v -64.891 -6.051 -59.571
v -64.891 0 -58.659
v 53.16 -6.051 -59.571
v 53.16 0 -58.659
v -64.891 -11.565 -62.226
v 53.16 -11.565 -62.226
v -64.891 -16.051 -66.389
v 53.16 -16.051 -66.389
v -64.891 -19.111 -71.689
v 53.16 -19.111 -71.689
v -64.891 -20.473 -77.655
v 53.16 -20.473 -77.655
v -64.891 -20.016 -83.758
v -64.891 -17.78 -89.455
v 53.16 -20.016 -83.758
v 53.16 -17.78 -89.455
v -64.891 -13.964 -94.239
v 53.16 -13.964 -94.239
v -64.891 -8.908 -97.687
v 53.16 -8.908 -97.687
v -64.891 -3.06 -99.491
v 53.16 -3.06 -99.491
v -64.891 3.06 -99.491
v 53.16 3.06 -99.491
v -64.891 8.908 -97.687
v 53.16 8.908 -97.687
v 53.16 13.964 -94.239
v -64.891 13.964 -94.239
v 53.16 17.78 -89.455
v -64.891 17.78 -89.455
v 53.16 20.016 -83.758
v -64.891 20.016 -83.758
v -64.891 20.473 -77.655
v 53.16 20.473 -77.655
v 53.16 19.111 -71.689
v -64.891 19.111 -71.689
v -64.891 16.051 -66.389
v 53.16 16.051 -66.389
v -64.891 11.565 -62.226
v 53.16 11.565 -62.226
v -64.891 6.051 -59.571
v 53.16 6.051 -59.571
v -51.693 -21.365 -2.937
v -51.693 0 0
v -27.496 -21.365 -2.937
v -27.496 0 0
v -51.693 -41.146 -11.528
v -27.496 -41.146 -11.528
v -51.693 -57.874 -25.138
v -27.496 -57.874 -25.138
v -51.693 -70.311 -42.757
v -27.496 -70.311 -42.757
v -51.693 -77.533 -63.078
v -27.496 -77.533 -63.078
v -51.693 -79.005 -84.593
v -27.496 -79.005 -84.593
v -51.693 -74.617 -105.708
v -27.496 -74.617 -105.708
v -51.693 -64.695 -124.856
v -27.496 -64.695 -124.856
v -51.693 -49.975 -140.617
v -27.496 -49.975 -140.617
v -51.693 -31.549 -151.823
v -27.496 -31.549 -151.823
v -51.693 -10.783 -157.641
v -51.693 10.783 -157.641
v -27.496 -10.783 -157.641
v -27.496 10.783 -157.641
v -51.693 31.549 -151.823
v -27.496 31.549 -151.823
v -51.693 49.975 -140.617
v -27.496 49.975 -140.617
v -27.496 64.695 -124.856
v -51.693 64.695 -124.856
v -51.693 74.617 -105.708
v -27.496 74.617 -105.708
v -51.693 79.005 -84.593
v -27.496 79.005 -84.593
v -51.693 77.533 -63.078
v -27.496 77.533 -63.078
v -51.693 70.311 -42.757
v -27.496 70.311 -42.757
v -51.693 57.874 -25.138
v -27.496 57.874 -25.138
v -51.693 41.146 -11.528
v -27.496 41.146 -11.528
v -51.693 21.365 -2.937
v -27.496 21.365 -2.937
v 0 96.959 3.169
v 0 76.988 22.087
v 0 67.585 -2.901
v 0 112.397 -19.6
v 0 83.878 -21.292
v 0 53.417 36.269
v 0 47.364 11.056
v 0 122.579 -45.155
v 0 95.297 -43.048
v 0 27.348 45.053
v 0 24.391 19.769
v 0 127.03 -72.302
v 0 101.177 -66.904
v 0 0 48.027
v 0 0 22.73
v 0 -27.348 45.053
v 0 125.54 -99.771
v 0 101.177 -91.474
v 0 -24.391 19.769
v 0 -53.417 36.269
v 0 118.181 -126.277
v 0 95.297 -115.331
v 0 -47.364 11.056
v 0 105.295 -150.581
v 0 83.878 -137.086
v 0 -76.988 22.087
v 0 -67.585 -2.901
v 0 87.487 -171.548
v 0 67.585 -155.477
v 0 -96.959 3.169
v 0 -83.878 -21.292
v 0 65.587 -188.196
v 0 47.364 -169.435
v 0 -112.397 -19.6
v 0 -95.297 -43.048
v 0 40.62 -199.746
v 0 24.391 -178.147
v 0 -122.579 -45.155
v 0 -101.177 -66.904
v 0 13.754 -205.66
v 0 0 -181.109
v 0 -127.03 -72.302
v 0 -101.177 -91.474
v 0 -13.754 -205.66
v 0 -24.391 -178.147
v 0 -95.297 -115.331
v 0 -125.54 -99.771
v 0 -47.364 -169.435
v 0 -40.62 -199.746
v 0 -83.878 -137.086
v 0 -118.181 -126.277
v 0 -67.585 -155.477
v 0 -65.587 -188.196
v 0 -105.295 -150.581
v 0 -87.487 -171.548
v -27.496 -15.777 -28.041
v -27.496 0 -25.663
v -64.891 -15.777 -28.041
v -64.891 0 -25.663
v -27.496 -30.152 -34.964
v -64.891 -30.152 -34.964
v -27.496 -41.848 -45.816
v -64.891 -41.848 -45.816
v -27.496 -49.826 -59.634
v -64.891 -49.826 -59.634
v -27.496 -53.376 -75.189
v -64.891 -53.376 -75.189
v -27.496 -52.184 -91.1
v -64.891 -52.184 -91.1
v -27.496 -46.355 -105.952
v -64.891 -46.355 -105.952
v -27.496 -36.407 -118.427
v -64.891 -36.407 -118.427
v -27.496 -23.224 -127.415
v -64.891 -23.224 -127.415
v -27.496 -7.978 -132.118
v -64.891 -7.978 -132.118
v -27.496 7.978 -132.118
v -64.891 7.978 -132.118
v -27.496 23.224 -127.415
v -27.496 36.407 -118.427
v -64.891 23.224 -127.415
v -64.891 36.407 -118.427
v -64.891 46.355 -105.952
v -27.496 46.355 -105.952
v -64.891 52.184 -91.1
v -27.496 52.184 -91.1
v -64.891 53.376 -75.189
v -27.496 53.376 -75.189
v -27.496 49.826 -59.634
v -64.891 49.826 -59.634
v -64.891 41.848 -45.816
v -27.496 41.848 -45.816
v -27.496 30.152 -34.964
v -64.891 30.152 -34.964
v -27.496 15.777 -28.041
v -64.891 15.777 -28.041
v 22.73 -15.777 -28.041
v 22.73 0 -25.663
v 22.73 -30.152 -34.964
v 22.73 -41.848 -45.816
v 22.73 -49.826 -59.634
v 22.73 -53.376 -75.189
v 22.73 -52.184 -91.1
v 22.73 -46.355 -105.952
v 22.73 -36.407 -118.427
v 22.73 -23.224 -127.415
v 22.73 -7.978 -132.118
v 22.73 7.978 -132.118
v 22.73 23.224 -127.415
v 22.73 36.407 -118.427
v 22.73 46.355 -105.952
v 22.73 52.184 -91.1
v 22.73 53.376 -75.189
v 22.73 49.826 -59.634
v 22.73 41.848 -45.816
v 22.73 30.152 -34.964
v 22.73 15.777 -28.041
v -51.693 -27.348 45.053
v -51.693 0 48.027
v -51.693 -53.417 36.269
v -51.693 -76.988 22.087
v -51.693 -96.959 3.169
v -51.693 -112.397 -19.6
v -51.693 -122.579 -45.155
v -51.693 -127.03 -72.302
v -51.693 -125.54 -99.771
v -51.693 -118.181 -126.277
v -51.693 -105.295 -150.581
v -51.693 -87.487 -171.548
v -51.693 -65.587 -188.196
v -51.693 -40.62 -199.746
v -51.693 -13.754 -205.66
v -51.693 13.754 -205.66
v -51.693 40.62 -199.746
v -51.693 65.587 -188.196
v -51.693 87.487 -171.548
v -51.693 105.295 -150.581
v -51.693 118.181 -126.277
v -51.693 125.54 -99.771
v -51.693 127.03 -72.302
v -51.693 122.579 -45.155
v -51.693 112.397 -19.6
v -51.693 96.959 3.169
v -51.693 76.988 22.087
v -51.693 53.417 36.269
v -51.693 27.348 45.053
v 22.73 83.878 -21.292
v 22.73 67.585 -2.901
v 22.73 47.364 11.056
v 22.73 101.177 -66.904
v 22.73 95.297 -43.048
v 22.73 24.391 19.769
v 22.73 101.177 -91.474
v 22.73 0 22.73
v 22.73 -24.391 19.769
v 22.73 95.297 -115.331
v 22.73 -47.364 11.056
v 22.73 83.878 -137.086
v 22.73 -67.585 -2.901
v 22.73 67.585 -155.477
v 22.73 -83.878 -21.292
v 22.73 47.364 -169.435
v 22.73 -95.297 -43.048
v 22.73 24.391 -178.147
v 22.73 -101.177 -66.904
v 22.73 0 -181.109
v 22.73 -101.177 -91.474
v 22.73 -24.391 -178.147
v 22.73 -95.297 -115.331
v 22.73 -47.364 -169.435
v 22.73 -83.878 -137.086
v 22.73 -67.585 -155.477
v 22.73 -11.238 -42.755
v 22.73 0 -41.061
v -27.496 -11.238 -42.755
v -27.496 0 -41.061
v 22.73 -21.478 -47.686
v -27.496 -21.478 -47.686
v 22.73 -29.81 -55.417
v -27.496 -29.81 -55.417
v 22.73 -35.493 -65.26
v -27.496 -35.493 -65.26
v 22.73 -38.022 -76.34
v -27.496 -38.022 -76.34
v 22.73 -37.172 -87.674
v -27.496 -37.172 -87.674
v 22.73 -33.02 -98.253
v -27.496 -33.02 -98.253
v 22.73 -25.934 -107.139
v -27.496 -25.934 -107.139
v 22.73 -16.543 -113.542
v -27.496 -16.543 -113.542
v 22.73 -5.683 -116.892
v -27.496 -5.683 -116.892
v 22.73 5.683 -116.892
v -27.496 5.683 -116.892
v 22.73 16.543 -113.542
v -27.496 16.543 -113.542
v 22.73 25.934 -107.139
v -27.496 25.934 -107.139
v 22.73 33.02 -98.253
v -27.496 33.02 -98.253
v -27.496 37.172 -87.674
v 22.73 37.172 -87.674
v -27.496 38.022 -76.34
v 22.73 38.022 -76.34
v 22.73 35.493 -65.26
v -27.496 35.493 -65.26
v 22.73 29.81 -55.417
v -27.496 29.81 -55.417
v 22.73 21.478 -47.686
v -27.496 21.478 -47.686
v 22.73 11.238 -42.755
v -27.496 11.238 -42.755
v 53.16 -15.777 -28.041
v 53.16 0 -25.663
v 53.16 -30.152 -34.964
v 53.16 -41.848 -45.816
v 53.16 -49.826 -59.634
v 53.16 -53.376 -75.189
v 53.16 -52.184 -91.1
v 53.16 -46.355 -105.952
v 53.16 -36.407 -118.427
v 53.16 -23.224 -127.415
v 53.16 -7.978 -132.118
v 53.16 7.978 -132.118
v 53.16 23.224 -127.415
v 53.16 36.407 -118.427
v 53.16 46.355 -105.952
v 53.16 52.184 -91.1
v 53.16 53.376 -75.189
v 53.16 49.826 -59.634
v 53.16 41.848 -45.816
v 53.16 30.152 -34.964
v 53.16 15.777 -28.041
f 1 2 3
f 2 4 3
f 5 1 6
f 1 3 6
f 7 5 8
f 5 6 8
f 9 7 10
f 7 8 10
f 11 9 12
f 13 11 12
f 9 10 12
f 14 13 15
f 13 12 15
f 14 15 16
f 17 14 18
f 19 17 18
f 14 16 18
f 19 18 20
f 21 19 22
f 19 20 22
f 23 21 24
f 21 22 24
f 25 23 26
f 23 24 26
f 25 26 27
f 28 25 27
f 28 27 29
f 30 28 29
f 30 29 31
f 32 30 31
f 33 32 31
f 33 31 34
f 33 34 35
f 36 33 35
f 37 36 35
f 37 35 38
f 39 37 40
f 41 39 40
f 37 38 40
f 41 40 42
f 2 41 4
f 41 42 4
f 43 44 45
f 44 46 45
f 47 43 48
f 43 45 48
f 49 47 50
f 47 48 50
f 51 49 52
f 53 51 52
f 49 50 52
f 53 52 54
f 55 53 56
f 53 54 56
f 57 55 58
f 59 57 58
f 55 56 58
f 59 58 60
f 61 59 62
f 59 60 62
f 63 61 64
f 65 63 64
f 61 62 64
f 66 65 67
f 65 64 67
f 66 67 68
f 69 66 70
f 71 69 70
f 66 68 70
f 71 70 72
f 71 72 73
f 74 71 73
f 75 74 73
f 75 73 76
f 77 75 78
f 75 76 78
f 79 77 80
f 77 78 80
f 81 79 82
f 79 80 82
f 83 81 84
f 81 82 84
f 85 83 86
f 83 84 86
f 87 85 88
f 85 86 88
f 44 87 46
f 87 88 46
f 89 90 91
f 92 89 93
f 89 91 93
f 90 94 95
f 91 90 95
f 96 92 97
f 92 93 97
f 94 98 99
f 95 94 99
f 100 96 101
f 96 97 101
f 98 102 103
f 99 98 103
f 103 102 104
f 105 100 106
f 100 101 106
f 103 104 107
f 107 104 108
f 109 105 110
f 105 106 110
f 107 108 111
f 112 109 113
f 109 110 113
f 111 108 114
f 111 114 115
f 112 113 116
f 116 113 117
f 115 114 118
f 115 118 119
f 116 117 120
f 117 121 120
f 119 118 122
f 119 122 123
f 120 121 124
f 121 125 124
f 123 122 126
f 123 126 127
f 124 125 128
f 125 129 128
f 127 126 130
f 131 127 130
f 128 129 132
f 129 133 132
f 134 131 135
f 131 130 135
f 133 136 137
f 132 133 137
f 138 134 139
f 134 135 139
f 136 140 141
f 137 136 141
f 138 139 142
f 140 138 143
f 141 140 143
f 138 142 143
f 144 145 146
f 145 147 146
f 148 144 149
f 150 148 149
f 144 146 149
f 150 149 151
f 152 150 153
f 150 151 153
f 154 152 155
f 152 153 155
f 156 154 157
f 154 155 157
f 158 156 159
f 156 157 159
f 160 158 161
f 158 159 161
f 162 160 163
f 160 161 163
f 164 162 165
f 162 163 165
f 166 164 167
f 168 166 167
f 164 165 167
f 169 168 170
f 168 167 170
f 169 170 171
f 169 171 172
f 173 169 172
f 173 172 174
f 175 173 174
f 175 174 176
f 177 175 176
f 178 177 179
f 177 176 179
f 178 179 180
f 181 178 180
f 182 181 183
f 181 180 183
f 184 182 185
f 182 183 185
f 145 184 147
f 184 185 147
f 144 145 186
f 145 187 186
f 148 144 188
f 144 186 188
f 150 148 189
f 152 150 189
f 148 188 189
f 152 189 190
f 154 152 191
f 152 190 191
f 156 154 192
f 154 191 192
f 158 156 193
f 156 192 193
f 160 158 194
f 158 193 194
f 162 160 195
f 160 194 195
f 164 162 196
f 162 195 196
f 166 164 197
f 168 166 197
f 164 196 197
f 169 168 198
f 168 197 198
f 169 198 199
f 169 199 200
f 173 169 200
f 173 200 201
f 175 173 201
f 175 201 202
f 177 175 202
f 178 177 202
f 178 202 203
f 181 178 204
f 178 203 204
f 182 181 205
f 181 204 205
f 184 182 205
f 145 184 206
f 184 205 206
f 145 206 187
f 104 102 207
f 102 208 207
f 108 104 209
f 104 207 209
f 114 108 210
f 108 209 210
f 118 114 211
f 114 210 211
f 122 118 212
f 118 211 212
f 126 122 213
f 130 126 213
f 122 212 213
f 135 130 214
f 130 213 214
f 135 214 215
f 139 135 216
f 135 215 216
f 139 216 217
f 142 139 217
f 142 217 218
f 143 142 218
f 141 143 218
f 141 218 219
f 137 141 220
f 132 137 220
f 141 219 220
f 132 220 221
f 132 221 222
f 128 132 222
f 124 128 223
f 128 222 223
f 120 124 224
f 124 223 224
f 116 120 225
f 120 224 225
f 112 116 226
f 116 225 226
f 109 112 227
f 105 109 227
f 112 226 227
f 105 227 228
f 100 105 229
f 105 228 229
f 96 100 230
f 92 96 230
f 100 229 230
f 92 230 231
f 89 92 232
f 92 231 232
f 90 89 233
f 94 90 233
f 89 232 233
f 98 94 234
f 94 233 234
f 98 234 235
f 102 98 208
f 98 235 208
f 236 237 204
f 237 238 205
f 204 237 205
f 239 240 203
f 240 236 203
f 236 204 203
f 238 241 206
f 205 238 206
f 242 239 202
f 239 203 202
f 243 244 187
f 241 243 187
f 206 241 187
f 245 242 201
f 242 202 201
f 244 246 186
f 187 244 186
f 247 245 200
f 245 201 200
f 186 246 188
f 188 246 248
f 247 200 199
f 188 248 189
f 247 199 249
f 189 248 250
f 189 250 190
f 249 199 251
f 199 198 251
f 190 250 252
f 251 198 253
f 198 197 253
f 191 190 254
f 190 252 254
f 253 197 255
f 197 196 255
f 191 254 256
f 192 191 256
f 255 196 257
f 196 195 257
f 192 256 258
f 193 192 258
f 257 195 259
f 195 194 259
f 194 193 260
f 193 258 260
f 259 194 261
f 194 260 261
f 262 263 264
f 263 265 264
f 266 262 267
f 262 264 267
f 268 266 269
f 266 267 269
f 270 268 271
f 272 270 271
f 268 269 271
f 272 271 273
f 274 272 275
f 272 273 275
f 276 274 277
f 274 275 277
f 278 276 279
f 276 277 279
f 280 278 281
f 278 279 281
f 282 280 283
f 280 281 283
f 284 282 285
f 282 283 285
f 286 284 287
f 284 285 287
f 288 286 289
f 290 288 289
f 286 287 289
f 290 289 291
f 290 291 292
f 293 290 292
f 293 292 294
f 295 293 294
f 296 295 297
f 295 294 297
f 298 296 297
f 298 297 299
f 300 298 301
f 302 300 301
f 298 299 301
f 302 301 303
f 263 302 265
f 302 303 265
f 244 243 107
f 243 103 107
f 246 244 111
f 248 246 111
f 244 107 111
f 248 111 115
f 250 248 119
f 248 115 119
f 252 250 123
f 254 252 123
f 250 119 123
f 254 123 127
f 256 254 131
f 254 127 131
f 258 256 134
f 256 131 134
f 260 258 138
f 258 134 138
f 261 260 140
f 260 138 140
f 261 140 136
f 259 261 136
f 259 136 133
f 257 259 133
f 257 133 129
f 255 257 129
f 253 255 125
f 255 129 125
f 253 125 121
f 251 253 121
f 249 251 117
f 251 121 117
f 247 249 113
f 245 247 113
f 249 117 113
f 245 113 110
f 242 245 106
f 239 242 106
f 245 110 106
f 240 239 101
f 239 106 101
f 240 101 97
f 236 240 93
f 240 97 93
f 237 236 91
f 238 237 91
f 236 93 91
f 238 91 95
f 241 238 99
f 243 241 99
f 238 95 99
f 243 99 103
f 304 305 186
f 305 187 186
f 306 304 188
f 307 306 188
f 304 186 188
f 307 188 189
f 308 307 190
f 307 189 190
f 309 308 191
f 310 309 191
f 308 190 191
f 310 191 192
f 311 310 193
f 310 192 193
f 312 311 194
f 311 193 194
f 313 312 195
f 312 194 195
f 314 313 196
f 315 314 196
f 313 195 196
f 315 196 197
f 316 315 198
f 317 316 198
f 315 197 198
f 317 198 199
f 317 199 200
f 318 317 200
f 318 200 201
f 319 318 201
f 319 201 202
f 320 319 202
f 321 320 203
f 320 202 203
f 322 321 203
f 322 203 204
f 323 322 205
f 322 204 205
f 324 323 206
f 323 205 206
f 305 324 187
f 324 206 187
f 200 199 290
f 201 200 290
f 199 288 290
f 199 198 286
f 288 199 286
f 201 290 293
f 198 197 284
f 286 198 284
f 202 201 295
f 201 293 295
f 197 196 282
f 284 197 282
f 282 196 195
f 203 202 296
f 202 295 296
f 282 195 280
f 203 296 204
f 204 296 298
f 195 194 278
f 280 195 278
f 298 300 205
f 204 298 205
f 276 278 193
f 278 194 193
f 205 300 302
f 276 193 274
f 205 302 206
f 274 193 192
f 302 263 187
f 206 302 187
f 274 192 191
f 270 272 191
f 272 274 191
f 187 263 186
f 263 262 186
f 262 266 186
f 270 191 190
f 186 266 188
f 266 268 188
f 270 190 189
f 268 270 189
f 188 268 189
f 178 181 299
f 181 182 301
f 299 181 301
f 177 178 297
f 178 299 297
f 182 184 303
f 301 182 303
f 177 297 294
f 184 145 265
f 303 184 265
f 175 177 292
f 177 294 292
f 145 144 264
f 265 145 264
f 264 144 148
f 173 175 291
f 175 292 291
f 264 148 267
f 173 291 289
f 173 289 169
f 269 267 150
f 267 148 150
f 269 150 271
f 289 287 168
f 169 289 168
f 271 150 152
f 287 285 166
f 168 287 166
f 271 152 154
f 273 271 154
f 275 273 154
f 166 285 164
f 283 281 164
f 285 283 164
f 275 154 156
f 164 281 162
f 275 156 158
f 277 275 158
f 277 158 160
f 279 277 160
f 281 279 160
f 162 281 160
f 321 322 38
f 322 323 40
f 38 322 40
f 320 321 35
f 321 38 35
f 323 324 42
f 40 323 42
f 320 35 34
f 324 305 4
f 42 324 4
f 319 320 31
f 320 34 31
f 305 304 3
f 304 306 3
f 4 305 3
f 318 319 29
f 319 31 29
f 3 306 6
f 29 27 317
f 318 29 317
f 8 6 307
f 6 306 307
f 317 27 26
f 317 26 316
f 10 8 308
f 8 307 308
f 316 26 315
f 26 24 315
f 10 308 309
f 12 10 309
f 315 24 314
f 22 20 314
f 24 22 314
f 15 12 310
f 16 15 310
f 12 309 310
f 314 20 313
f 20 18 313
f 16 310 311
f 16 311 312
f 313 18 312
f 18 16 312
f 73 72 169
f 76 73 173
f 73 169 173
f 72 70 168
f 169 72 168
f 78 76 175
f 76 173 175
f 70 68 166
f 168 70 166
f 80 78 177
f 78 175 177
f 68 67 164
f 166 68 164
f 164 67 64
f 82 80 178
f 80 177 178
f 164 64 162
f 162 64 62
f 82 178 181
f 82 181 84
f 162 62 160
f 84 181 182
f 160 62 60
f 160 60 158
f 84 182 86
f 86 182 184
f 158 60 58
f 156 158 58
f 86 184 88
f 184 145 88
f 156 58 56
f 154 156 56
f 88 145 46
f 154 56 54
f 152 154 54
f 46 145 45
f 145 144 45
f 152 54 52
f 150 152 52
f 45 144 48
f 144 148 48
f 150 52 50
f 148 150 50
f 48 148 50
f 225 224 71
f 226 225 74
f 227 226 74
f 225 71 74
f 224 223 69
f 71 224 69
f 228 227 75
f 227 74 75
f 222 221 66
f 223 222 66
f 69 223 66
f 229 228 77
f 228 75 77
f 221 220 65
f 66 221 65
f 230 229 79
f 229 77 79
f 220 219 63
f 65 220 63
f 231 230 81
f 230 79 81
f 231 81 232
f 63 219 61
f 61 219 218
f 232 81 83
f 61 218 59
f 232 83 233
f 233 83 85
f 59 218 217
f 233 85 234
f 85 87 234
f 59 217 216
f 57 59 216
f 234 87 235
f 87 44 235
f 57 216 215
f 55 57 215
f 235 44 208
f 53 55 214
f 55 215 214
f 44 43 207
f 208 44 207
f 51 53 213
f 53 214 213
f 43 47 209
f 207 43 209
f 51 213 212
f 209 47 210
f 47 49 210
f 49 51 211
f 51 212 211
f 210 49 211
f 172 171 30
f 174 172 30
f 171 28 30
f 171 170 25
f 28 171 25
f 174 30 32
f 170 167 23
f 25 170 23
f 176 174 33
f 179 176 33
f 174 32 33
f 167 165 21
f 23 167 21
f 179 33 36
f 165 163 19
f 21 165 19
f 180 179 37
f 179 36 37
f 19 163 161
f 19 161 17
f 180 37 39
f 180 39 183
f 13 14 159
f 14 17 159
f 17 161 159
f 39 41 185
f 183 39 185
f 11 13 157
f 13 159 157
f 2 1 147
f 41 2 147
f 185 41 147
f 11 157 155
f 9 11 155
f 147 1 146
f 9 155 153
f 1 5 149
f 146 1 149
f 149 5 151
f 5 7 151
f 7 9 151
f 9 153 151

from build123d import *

# Parameters (mm, degrees)
F0_W = 27.4963006377
F0_H = 22.7302610874


with BuildPart() as f1:
    # F0 (on Front) → F1 (revolve)
    with BuildSketch(Plane.XZ):
        with Locations((-13.7481503189, 11.3651305437)):
            Rectangle(F0_W, F0_H)
        Polygon((0, 48.0268597603), (-51.6930520535, 48.0268597603), (-51.6930520535, 0), (-27.4963006377, 0), (-27.4963006377, 22.7302610874), (0, 22.7302610874), align=None)
        Polygon((22.7302908897, 22.7302610874), (0, 22.7302610874), (0, 0), (-27.4963006377, 0), (-27.4963006377, -25.663241744), (22.7302908897, -25.663241744), align=None)
    revolve(axis=Axis((3.2995641232, 0, -79.1893750429), (1, 0, 0)))


with BuildPart() as f1b:
    # F0 (on Front) → F1, piece 2 (revolve)
    with BuildSketch(Plane.XZ):
        Polygon((-27.4963006377, -41.0611778498), (-27.4963006377, -25.663241744), (-64.8912787437, -25.663241744), (-64.8912787437, -58.6588084698), (53.1595349312, -58.6588084698), (53.1595349312, -25.663241744), (22.7302908897, -25.663241744), (22.7302908897, -41.0611778498), align=None)
    revolve(axis=Axis((3.2995641232, 0, -79.1893750429), (1, 0, 0)))


solid = Compound([f1.part, f1b.part])
